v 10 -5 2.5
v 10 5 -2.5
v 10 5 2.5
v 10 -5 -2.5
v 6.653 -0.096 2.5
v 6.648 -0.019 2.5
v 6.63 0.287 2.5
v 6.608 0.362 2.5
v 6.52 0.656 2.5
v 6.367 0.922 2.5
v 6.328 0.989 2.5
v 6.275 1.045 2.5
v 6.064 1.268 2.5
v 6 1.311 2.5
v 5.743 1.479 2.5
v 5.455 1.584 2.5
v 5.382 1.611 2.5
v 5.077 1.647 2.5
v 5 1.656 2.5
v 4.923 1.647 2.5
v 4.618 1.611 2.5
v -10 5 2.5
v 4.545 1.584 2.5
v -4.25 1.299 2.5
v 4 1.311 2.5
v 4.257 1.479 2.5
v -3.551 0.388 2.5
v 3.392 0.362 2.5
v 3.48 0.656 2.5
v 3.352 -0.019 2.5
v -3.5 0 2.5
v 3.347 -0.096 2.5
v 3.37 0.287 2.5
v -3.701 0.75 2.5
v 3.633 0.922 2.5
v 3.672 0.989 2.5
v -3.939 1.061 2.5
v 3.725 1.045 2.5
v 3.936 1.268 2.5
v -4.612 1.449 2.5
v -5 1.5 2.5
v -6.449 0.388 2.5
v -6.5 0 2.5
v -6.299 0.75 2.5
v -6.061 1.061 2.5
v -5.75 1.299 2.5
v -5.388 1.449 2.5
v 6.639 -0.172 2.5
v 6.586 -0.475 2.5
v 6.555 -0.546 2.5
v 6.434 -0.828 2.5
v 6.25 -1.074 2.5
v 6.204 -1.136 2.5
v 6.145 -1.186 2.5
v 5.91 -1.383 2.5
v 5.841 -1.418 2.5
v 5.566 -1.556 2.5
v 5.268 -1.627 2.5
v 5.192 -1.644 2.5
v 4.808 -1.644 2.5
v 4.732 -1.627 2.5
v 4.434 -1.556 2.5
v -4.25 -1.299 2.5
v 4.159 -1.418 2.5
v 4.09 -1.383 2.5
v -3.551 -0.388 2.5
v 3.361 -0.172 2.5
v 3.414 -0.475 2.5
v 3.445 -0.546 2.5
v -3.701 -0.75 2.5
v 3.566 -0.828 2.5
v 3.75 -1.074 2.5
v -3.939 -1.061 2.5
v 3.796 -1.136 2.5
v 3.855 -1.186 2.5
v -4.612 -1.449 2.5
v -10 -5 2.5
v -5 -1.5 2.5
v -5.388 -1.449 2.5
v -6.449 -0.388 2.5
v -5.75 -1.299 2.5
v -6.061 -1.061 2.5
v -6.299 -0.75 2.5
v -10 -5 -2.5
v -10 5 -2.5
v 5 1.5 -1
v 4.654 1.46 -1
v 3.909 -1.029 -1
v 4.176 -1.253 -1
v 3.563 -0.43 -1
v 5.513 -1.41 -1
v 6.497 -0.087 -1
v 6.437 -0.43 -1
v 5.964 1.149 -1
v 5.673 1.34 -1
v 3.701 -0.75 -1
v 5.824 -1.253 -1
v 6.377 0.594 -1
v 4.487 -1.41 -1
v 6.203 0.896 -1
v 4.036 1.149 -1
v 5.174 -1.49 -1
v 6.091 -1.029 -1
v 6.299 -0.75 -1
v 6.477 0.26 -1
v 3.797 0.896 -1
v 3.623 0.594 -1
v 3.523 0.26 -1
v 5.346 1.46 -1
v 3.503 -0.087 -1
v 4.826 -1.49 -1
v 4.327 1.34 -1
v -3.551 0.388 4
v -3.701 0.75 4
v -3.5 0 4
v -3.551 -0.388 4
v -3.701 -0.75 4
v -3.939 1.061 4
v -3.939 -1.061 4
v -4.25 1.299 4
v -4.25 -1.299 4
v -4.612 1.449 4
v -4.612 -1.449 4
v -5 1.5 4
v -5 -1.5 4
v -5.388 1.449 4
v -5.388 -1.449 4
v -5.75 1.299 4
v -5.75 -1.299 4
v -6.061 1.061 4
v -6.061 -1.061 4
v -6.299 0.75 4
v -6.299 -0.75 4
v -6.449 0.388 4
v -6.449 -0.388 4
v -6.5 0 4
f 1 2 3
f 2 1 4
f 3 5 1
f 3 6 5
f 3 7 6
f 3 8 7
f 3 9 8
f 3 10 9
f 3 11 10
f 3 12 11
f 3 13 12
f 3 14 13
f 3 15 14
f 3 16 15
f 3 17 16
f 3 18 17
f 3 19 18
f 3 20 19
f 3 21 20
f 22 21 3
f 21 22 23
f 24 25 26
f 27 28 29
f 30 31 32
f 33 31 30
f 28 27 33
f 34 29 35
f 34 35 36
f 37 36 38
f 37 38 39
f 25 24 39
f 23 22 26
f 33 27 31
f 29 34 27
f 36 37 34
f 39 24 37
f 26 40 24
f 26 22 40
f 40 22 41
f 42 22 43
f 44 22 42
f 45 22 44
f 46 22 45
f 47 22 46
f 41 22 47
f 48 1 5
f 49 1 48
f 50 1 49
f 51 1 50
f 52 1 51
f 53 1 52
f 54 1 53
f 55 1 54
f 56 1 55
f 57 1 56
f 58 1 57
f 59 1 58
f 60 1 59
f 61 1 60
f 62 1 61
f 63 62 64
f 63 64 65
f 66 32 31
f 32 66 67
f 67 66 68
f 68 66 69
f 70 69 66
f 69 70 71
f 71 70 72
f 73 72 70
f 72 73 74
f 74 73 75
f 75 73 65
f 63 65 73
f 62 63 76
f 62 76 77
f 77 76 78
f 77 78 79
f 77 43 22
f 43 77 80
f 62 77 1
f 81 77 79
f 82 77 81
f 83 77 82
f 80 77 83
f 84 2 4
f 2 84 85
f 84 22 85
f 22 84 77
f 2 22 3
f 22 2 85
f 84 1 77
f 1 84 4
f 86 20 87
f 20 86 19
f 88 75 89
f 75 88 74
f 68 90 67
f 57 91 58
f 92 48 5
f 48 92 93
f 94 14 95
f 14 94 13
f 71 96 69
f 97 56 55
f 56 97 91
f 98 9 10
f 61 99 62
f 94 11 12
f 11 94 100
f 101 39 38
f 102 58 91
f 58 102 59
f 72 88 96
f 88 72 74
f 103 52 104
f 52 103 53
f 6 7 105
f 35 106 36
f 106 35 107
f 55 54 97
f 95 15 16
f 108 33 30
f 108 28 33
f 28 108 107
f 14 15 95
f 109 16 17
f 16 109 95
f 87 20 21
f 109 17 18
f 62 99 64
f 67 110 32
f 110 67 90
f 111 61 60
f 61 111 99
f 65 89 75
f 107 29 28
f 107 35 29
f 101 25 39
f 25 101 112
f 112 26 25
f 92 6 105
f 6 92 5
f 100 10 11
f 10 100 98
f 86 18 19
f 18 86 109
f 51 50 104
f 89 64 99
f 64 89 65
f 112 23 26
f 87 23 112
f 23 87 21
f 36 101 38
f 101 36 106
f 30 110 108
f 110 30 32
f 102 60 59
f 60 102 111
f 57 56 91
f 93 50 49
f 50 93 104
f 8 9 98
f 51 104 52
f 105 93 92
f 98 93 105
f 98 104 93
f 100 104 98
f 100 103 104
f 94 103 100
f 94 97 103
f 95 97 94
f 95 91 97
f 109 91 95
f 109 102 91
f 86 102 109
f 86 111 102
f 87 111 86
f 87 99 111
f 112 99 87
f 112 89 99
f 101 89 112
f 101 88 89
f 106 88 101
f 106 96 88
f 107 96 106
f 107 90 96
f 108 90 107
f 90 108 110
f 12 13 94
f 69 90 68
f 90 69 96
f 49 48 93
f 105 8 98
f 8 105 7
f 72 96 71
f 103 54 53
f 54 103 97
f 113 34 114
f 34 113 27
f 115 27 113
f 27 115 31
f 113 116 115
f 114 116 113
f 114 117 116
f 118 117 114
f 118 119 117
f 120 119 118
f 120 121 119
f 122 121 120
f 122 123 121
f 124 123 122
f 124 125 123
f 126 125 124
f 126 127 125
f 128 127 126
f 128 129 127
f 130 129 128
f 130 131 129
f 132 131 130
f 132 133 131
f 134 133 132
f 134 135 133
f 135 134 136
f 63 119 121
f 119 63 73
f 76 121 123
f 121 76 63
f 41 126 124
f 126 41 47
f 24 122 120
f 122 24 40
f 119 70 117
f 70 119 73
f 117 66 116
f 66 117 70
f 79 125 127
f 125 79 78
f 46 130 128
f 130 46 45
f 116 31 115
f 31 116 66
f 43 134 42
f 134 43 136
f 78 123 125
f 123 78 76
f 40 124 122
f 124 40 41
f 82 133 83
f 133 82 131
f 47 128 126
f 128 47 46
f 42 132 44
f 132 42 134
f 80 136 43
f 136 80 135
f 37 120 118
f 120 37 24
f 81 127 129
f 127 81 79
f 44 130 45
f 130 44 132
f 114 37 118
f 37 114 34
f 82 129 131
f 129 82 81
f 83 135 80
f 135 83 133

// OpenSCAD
$fa = 1;
$fs = 0.4;
difference() {
    cube([20,10,5],center=true);
    translate([5,0,-1])
        rotate([0,0,90])
            cylinder(4.5,1.5,1.7);
    };
translate([-5,0,-1])
    cylinder(5,1.5,1.5);
